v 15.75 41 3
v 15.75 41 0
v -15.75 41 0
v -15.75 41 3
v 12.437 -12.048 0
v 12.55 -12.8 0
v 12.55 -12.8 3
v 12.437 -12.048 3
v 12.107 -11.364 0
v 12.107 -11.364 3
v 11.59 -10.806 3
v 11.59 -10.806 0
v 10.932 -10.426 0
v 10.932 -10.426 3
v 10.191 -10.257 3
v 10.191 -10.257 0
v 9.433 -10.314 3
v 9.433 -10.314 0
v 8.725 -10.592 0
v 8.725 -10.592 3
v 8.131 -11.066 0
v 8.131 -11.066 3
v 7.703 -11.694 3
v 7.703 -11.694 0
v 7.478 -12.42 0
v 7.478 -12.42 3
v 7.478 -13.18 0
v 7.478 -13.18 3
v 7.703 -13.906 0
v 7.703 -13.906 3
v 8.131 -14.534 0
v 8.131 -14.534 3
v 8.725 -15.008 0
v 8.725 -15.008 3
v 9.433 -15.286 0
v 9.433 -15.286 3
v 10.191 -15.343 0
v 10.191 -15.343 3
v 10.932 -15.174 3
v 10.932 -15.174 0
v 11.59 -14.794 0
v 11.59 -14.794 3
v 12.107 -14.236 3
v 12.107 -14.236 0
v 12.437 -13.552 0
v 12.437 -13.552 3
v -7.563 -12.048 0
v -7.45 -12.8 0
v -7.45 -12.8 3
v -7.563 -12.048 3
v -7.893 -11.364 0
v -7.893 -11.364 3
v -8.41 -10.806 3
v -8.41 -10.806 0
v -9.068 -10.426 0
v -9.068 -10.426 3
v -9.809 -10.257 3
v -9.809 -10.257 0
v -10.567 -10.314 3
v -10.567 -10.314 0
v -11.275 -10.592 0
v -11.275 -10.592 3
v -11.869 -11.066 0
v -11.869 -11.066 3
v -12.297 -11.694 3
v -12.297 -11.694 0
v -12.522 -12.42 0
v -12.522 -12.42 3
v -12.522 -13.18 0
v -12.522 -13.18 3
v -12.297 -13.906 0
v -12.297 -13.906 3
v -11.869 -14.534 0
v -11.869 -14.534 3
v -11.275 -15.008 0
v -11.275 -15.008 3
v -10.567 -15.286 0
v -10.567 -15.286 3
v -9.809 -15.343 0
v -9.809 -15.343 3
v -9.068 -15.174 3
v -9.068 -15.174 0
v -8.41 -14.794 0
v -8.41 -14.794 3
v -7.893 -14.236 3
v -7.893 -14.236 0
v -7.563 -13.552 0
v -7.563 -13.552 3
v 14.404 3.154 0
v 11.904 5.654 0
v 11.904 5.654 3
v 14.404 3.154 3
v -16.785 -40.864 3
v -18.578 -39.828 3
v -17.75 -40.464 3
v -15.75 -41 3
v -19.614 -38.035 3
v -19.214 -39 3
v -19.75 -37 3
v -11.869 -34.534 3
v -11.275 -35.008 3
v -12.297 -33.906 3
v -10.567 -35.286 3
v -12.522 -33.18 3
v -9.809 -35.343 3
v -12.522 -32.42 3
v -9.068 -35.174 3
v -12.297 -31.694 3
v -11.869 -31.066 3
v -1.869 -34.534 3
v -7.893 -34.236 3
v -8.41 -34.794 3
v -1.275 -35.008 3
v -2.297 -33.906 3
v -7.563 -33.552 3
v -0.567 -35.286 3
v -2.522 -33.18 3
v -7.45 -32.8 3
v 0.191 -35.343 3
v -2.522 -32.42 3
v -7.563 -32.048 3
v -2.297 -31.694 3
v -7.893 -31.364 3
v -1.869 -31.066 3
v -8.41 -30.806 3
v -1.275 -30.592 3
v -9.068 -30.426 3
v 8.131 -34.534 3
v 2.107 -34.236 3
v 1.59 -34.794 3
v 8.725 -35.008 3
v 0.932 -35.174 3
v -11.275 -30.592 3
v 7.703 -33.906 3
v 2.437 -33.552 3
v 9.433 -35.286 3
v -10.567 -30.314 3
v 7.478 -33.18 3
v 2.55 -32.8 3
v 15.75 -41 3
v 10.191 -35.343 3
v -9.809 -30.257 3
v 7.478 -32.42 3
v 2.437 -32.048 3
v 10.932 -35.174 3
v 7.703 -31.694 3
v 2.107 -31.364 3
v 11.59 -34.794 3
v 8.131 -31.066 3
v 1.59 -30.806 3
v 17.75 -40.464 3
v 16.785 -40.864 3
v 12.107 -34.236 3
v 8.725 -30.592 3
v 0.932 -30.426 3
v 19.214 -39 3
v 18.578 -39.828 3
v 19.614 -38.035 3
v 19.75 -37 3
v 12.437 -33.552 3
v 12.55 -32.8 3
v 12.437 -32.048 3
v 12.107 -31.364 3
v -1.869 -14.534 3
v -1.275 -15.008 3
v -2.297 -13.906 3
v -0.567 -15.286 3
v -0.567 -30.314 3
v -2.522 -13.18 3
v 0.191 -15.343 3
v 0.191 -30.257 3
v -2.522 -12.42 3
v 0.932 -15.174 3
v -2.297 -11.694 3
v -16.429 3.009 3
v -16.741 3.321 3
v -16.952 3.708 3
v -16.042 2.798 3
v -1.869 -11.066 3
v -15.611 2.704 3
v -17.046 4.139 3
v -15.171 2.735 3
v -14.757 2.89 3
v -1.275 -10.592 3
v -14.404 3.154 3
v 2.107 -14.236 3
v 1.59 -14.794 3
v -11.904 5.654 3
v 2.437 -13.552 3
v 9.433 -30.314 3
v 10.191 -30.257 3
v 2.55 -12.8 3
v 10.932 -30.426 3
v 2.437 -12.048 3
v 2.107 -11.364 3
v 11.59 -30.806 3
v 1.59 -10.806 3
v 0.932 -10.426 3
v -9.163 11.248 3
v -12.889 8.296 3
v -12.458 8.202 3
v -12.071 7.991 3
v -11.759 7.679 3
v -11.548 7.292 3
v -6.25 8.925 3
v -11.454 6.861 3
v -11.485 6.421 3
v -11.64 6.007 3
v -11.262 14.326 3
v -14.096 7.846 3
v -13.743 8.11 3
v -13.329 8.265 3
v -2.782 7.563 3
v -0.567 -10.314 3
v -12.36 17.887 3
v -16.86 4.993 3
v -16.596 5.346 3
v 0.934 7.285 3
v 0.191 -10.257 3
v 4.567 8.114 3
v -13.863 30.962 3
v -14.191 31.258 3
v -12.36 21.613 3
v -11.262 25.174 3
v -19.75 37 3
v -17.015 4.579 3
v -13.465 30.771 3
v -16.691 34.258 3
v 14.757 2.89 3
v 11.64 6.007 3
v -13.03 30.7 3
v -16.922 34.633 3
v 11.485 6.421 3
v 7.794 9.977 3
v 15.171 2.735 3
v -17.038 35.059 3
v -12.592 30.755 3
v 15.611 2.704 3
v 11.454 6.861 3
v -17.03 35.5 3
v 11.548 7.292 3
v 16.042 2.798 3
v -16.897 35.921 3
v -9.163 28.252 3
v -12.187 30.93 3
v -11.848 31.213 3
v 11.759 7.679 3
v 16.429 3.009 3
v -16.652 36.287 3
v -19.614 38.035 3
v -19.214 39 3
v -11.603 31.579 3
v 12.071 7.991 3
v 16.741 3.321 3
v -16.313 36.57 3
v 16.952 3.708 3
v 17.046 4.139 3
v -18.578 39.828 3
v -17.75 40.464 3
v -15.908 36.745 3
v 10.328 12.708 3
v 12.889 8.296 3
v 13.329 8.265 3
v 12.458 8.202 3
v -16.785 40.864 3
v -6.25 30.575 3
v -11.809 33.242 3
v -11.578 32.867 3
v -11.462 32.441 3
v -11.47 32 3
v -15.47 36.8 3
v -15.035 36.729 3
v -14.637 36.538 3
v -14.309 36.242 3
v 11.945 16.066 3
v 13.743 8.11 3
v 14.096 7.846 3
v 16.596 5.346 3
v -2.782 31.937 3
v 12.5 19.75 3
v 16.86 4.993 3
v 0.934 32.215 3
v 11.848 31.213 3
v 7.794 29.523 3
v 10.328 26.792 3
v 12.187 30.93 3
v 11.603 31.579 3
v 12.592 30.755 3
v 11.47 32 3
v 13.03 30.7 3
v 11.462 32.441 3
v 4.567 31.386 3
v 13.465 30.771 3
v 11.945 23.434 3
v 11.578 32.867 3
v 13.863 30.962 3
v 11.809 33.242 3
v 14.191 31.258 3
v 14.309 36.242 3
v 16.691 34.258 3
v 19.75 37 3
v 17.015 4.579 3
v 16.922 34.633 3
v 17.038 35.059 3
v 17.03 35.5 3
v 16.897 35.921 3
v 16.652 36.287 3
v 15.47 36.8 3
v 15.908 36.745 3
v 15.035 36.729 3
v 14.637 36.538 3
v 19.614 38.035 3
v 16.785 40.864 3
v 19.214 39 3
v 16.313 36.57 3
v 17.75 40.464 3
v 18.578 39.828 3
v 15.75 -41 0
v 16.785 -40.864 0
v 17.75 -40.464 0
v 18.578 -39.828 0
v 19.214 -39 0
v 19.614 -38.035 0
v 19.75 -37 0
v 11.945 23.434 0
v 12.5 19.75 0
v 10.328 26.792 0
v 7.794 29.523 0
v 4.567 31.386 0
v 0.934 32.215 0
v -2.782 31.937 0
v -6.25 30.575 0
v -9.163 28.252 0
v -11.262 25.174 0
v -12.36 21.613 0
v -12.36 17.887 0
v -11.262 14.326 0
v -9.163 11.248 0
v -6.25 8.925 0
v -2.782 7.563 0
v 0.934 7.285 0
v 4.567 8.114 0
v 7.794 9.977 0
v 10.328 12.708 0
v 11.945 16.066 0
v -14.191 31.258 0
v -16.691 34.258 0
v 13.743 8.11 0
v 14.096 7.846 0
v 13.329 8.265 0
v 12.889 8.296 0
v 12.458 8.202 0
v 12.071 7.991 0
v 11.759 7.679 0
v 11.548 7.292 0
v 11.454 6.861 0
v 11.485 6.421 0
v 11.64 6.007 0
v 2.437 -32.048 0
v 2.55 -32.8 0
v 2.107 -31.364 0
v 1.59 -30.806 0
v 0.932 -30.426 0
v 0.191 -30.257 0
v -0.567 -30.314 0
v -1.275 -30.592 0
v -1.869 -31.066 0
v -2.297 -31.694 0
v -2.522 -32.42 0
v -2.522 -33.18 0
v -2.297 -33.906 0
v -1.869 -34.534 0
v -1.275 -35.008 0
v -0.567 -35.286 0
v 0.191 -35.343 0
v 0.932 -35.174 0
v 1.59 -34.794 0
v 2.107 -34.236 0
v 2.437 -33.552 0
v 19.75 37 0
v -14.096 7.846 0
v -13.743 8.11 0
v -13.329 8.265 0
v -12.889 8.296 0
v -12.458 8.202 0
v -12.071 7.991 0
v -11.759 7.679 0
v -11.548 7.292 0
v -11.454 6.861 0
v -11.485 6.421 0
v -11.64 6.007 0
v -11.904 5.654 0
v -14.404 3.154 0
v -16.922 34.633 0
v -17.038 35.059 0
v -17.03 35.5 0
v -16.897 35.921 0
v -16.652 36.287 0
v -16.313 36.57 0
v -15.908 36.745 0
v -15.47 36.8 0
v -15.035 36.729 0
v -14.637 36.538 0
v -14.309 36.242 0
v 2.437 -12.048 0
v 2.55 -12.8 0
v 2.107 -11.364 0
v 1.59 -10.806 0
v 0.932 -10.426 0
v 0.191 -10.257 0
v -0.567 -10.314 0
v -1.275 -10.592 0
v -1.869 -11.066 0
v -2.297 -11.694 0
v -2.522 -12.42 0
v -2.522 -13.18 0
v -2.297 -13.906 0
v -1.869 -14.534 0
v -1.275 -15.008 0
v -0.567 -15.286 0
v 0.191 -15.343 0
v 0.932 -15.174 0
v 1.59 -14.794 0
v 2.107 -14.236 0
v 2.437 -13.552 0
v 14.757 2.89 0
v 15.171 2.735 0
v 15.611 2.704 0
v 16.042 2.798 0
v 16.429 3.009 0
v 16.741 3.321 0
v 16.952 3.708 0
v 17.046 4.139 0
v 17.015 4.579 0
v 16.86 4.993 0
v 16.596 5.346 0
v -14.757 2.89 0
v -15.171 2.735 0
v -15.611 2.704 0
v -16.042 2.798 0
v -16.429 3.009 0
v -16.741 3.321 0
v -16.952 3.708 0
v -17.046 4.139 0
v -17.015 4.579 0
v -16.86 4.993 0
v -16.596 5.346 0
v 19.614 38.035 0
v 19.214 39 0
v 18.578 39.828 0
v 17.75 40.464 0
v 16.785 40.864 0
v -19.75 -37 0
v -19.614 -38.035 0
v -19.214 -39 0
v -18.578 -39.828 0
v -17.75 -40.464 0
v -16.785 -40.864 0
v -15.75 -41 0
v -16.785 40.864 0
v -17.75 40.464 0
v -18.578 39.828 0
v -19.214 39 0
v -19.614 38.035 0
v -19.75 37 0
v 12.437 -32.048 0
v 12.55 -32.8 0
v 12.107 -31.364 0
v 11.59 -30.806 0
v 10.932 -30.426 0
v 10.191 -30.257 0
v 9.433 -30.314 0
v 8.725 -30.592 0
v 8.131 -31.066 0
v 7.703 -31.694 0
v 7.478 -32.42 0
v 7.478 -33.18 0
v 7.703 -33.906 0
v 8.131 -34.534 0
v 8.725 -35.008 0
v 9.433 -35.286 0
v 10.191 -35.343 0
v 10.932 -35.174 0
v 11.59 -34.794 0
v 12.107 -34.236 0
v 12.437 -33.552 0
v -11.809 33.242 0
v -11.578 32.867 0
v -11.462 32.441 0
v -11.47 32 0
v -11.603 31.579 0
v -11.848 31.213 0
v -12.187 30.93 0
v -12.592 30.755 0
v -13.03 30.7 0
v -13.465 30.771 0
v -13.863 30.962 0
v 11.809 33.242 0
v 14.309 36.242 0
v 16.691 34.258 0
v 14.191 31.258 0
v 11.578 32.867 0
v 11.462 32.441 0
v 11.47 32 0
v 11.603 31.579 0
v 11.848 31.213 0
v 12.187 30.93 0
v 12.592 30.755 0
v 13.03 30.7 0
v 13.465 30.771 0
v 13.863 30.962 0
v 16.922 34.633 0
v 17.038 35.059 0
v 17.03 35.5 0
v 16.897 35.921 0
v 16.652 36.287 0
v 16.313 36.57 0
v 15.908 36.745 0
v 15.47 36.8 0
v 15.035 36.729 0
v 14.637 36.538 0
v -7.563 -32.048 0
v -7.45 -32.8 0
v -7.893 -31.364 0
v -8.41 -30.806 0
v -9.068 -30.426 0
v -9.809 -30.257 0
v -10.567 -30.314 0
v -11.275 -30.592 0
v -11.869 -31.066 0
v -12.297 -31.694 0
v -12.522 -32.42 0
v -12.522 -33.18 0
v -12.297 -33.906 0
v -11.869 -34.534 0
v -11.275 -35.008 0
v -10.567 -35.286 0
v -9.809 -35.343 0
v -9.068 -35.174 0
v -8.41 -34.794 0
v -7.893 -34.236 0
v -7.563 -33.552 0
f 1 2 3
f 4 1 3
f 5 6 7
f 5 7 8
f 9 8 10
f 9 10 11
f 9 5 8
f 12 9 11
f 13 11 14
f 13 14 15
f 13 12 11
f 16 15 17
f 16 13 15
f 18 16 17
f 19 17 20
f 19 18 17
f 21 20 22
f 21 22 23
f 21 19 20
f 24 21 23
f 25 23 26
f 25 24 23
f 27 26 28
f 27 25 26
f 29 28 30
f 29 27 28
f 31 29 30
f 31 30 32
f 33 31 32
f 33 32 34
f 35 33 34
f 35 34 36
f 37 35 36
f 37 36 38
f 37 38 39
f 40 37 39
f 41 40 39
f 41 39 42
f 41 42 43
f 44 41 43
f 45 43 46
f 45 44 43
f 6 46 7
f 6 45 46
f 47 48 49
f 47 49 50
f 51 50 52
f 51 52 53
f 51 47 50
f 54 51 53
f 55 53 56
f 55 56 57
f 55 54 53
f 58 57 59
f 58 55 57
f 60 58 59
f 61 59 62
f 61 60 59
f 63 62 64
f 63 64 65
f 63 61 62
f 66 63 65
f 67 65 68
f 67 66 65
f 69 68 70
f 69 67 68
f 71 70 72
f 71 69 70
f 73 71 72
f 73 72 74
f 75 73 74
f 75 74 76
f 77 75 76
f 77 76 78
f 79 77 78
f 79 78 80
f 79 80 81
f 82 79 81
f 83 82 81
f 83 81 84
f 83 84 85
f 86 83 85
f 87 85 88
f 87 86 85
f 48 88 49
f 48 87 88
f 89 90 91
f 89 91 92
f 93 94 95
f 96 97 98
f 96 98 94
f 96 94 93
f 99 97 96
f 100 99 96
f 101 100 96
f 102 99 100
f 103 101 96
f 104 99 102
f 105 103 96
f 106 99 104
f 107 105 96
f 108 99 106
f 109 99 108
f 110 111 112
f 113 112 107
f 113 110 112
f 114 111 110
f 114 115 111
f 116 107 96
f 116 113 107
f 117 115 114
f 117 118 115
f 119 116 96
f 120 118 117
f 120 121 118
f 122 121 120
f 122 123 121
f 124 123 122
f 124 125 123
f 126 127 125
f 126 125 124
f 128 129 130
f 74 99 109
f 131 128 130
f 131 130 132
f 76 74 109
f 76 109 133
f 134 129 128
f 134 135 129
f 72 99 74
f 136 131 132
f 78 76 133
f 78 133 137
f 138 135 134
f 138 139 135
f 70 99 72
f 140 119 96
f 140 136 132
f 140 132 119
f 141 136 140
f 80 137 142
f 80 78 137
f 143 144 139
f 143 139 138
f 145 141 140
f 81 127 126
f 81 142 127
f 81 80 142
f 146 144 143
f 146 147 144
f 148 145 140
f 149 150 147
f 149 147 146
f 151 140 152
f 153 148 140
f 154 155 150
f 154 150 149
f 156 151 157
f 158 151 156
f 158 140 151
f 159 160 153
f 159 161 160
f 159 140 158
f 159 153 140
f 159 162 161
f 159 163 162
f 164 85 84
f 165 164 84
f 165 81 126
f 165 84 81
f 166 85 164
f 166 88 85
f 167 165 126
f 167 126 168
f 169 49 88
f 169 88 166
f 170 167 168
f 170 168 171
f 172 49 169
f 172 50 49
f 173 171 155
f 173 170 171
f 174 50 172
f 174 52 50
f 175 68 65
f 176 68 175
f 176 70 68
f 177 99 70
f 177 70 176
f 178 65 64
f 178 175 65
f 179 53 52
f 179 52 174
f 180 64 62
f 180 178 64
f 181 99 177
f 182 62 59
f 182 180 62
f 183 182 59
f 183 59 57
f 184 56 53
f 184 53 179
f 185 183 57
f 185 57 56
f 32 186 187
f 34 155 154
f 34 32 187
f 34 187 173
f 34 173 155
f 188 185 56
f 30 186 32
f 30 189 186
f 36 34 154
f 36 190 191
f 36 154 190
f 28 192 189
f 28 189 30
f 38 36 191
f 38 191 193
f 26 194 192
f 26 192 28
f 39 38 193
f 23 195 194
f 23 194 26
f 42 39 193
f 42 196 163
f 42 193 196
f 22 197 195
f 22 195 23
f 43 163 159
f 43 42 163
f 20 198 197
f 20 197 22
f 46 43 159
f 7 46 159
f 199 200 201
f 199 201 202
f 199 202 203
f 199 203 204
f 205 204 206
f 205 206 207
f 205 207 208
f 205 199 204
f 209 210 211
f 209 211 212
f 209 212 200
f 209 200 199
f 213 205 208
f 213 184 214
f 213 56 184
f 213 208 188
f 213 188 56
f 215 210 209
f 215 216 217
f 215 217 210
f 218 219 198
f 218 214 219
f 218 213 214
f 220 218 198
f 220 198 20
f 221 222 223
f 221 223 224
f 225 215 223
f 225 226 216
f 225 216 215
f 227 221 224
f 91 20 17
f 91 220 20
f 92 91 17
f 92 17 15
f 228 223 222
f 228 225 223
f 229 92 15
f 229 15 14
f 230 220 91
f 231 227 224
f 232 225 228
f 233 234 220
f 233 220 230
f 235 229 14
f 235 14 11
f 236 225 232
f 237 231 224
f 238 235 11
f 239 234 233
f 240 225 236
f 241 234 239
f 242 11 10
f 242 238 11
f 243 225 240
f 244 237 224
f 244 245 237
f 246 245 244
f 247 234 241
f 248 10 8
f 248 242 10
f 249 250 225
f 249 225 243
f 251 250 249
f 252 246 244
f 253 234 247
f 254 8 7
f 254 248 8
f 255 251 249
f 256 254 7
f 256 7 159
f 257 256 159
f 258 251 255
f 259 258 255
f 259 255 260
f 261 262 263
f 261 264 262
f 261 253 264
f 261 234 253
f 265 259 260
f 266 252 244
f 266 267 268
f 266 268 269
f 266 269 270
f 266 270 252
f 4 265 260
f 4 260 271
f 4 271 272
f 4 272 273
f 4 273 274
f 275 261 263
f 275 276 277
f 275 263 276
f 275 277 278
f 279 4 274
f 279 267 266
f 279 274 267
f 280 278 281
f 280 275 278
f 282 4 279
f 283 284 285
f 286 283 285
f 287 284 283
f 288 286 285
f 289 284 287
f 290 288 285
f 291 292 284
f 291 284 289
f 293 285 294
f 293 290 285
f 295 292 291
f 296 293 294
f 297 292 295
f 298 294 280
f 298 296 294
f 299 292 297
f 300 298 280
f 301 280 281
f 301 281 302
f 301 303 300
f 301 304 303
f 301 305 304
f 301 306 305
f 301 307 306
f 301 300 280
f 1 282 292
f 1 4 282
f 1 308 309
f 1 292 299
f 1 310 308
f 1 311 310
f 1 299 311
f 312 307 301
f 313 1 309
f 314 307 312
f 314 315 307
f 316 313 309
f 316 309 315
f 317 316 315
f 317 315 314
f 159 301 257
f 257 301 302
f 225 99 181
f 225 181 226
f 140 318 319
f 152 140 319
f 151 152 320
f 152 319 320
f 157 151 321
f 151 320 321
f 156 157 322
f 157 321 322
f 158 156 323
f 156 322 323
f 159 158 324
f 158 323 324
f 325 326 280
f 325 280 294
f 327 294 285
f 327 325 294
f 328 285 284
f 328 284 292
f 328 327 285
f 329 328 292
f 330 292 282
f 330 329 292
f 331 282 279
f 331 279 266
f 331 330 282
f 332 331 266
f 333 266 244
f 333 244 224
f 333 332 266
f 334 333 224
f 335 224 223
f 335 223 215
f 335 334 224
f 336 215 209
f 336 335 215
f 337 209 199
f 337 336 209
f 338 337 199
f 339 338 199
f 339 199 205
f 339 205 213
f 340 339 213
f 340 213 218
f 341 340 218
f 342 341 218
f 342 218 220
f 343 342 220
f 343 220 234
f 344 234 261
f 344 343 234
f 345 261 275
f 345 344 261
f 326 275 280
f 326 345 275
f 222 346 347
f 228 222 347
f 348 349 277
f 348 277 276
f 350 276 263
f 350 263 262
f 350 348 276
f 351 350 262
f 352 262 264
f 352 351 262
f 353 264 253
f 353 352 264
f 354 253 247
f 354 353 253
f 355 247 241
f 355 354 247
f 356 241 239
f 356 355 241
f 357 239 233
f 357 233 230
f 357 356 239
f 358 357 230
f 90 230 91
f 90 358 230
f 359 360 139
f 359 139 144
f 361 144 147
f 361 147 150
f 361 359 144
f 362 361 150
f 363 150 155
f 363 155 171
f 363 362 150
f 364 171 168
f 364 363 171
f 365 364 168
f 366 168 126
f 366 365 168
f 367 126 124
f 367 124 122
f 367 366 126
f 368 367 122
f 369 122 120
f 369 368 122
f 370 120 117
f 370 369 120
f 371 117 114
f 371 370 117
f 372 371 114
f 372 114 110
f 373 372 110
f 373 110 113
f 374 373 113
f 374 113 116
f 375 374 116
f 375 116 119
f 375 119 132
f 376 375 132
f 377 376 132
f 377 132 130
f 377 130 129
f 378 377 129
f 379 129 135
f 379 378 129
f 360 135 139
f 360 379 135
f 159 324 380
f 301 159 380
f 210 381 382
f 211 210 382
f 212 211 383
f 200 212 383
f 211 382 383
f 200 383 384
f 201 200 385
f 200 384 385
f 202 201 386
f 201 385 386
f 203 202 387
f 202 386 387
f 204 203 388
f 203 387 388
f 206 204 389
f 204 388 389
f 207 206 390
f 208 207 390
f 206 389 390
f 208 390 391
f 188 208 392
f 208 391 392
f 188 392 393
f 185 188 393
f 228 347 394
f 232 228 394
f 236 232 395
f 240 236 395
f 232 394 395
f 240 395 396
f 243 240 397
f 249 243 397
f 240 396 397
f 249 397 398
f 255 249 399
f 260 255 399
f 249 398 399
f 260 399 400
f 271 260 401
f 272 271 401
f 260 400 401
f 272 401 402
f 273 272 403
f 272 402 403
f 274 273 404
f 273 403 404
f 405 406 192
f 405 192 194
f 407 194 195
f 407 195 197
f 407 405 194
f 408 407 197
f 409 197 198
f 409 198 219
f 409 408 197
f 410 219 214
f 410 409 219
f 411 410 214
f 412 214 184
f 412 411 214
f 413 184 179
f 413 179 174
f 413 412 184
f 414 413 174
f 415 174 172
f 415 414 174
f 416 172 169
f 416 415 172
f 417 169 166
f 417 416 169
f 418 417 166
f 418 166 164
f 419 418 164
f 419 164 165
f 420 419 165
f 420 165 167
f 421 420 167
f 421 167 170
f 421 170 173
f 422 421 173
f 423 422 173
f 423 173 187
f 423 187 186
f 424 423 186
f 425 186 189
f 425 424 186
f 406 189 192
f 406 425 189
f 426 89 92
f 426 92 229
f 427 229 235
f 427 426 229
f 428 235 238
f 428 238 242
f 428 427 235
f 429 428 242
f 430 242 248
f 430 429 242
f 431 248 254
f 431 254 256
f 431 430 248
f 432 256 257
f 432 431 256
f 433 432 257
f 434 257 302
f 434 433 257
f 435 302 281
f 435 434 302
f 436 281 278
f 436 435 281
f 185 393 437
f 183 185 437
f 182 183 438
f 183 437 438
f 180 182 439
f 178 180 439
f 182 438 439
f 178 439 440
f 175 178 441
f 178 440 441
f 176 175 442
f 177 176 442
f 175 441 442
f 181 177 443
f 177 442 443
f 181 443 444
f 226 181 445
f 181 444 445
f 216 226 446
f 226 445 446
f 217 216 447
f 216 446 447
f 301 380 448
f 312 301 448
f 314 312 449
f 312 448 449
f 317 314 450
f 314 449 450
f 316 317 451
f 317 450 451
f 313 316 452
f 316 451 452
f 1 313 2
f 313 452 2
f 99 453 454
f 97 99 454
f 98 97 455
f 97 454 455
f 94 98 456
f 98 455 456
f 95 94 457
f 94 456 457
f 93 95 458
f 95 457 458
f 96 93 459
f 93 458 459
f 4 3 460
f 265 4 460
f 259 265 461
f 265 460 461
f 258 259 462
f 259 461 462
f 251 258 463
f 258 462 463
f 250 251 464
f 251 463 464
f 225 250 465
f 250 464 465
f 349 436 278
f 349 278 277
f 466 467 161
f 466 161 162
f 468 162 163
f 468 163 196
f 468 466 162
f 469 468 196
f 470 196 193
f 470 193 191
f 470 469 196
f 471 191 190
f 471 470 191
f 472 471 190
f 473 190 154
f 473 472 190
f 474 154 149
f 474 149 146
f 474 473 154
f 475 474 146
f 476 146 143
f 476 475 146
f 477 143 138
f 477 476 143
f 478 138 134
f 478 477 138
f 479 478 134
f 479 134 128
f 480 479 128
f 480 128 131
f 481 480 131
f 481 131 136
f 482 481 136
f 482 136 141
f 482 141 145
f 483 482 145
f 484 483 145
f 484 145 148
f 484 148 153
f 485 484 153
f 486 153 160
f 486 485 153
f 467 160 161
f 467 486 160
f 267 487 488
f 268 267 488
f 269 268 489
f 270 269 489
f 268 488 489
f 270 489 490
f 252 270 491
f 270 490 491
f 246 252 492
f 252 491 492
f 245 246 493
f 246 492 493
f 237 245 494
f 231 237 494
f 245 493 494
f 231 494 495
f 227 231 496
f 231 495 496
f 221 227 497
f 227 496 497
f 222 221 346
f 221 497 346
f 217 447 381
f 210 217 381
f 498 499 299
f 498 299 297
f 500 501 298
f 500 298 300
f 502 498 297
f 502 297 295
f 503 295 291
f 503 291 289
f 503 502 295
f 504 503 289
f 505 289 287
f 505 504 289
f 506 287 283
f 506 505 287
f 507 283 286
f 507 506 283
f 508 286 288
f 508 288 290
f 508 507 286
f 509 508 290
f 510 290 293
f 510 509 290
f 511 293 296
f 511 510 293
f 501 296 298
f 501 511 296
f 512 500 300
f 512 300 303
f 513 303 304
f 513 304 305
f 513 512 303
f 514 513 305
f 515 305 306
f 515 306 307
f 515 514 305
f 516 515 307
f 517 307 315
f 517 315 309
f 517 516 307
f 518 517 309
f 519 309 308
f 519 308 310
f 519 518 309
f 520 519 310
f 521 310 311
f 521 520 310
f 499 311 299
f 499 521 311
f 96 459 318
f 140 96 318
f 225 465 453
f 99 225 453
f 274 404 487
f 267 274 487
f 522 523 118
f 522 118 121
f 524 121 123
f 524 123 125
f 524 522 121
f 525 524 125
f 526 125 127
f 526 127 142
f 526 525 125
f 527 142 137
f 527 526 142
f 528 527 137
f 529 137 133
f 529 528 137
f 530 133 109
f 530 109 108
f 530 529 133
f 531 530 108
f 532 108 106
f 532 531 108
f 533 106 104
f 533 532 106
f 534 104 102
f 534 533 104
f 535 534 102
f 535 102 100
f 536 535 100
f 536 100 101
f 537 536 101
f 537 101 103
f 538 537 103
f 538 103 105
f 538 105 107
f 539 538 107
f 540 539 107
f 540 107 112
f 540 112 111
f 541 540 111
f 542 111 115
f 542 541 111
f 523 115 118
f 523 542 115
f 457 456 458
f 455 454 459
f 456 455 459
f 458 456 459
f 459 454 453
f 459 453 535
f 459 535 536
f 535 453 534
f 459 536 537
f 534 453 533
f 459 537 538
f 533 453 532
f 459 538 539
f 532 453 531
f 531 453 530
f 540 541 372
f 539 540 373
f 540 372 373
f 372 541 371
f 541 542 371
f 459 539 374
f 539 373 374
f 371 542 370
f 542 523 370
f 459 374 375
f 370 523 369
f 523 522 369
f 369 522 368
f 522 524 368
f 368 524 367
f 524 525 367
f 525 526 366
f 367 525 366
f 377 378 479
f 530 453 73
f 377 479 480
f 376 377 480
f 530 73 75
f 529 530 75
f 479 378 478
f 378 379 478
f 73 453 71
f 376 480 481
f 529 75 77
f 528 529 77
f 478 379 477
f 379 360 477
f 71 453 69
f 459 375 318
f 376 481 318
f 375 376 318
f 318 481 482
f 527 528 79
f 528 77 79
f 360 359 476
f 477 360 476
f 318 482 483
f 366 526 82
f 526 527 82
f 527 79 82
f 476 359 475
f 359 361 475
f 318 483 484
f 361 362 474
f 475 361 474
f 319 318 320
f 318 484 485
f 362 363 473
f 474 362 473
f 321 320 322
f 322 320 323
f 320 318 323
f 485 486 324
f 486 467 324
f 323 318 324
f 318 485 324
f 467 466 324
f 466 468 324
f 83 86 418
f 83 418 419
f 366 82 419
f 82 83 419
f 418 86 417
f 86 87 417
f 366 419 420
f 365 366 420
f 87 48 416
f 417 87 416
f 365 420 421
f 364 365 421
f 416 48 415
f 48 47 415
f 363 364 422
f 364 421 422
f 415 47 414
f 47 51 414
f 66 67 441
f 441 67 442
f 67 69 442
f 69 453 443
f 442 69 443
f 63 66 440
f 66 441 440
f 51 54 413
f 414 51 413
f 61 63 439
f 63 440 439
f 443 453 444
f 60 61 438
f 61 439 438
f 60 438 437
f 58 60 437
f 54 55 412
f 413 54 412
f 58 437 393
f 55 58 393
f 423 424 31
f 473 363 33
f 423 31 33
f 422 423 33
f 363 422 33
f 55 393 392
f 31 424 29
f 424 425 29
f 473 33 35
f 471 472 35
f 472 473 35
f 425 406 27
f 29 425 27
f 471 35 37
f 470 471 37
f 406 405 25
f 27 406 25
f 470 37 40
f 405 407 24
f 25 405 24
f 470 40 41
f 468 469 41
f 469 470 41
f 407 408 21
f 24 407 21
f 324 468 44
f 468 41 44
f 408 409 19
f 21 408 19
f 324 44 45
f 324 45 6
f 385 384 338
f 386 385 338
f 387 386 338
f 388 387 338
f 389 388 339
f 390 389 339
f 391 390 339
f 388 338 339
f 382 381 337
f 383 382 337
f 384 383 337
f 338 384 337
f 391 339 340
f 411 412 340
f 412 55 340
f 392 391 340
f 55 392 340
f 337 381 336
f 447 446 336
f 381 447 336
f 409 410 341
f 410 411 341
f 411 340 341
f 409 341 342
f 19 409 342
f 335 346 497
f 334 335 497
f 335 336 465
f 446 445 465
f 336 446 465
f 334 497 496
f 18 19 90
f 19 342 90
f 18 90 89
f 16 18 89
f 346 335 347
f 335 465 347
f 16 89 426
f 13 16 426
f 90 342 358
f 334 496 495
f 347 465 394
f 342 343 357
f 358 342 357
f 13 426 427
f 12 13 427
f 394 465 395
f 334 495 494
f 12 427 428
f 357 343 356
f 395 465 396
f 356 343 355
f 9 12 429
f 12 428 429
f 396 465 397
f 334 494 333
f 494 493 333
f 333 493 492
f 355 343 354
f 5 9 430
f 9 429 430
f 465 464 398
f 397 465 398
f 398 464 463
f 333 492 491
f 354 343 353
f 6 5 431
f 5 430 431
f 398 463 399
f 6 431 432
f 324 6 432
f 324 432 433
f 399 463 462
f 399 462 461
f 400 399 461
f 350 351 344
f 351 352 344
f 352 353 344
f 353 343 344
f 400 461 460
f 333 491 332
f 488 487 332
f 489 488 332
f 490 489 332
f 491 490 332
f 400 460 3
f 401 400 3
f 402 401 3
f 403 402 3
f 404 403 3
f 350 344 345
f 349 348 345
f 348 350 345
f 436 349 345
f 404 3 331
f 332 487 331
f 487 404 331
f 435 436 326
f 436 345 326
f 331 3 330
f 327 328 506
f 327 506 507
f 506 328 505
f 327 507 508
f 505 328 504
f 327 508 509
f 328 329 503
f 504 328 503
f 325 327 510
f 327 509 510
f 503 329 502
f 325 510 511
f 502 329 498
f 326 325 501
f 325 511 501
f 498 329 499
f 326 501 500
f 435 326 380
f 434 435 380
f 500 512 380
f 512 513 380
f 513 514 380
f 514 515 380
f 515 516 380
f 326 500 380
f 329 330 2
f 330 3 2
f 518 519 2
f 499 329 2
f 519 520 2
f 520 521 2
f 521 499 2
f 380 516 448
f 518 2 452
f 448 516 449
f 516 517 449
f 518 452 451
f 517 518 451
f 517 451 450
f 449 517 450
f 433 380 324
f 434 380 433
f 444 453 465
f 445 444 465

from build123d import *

# Parameters (mm, degrees)
SCHIZZO1_R                   = 12.5
SCHIZZO1_R_2                 = 2.55
ESTRUSIONE_ESTRUSIONE1_DEPTH = 3


with BuildPart() as part:
    # Schizzo1 → Estrusione-Estrusione1 (new body)
    with BuildSketch(Plane.XY):
        with BuildLine():
            Line((-15.75, -41), (15.75, -41))
            ThreePointArc((15.75, -41), (18.578427125, -39.828427125), (19.75, -37))
            Line((19.75, -37), (19.75, 37))
            ThreePointArc((19.75, 37), (18.578427125, 39.828427125), (15.75, 41))
            Line((15.75, 41), (-15.75, 41))
            ThreePointArc((-15.75, 41), (-18.578427125, 39.828427125), (-19.75, 37))
            Line((-19.75, 37), (-19.75, -37))
            ThreePointArc((-19.75, -37), (-18.578427125, -39.828427125), (-15.75, -41))
        make_face()
        with Locations((0, 19.75)):
            Circle(SCHIZZO1_R, mode=Mode.SUBTRACT)
        with Locations((-10, -12.8)):
            Circle(SCHIZZO1_R_2, mode=Mode.SUBTRACT)
        with Locations((0, -12.8)):
            Circle(SCHIZZO1_R_2, mode=Mode.SUBTRACT)
        with Locations((10, -12.8)):
            Circle(SCHIZZO1_R_2, mode=Mode.SUBTRACT)
        with Locations((10, -32.8)):
            Circle(SCHIZZO1_R_2, mode=Mode.SUBTRACT)
        with Locations((0, -32.8)):
            Circle(SCHIZZO1_R_2, mode=Mode.SUBTRACT)
        with Locations((-10, -32.8)):
            Circle(SCHIZZO1_R_2, mode=Mode.SUBTRACT)
        with BuildLine():
            Line((-14.309257017, 36.242285819), (-11.809257017, 33.242285819))
            ThreePointArc((-11.809257017, 33.242285819), (-12.007714181, 31.059257017), (-14.190742983, 31.257714181))
            Line((-14.190742983, 31.257714181), (-16.690742983, 34.257714181))
            ThreePointArc((-16.690742983, 34.257714181), (-16.492285819, 36.440742983), (-14.309257017, 36.242285819))
        make_face(mode=Mode.SUBTRACT)
        with BuildLine():
            Line((14.309257017, 36.242285819), (11.809257017, 33.242285819))
            ThreePointArc((11.809257017, 33.242285819), (12.007714181, 31.059257017), (14.190742983, 31.257714181))
            Line((14.190742983, 31.257714181), (16.690742983, 34.257714181))
            ThreePointArc((16.690742983, 34.257714181), (16.492285819, 36.440742983), (14.309257017, 36.242285819))
        make_face(mode=Mode.SUBTRACT)
        with BuildLine():
            Line((-11.903984489, 5.653984489), (-14.403984489, 3.153984489))
            ThreePointArc((-14.403984489, 3.153984489), (-16.596015511, 3.153984489), (-16.596015511, 5.346015511))
            Line((-16.596015511, 5.346015511), (-14.096015511, 7.846015511))
            ThreePointArc((-14.096015511, 7.846015511), (-11.903984489, 7.846015511), (-11.903984489, 5.653984489))
        make_face(mode=Mode.SUBTRACT)
        with BuildLine():
            Line((11.903984489, 5.653984489), (14.403984489, 3.153984489))
            ThreePointArc((14.403984489, 3.153984489), (16.596015511, 3.153984489), (16.596015511, 5.346015511))
            Line((16.596015511, 5.346015511), (14.096015511, 7.846015511))
            ThreePointArc((14.096015511, 7.846015511), (11.903984489, 7.846015511), (11.903984489, 5.653984489))
        make_face(mode=Mode.SUBTRACT)
    extrude(amount=ESTRUSIONE_ESTRUSIONE1_DEPTH)


solid = part.part
